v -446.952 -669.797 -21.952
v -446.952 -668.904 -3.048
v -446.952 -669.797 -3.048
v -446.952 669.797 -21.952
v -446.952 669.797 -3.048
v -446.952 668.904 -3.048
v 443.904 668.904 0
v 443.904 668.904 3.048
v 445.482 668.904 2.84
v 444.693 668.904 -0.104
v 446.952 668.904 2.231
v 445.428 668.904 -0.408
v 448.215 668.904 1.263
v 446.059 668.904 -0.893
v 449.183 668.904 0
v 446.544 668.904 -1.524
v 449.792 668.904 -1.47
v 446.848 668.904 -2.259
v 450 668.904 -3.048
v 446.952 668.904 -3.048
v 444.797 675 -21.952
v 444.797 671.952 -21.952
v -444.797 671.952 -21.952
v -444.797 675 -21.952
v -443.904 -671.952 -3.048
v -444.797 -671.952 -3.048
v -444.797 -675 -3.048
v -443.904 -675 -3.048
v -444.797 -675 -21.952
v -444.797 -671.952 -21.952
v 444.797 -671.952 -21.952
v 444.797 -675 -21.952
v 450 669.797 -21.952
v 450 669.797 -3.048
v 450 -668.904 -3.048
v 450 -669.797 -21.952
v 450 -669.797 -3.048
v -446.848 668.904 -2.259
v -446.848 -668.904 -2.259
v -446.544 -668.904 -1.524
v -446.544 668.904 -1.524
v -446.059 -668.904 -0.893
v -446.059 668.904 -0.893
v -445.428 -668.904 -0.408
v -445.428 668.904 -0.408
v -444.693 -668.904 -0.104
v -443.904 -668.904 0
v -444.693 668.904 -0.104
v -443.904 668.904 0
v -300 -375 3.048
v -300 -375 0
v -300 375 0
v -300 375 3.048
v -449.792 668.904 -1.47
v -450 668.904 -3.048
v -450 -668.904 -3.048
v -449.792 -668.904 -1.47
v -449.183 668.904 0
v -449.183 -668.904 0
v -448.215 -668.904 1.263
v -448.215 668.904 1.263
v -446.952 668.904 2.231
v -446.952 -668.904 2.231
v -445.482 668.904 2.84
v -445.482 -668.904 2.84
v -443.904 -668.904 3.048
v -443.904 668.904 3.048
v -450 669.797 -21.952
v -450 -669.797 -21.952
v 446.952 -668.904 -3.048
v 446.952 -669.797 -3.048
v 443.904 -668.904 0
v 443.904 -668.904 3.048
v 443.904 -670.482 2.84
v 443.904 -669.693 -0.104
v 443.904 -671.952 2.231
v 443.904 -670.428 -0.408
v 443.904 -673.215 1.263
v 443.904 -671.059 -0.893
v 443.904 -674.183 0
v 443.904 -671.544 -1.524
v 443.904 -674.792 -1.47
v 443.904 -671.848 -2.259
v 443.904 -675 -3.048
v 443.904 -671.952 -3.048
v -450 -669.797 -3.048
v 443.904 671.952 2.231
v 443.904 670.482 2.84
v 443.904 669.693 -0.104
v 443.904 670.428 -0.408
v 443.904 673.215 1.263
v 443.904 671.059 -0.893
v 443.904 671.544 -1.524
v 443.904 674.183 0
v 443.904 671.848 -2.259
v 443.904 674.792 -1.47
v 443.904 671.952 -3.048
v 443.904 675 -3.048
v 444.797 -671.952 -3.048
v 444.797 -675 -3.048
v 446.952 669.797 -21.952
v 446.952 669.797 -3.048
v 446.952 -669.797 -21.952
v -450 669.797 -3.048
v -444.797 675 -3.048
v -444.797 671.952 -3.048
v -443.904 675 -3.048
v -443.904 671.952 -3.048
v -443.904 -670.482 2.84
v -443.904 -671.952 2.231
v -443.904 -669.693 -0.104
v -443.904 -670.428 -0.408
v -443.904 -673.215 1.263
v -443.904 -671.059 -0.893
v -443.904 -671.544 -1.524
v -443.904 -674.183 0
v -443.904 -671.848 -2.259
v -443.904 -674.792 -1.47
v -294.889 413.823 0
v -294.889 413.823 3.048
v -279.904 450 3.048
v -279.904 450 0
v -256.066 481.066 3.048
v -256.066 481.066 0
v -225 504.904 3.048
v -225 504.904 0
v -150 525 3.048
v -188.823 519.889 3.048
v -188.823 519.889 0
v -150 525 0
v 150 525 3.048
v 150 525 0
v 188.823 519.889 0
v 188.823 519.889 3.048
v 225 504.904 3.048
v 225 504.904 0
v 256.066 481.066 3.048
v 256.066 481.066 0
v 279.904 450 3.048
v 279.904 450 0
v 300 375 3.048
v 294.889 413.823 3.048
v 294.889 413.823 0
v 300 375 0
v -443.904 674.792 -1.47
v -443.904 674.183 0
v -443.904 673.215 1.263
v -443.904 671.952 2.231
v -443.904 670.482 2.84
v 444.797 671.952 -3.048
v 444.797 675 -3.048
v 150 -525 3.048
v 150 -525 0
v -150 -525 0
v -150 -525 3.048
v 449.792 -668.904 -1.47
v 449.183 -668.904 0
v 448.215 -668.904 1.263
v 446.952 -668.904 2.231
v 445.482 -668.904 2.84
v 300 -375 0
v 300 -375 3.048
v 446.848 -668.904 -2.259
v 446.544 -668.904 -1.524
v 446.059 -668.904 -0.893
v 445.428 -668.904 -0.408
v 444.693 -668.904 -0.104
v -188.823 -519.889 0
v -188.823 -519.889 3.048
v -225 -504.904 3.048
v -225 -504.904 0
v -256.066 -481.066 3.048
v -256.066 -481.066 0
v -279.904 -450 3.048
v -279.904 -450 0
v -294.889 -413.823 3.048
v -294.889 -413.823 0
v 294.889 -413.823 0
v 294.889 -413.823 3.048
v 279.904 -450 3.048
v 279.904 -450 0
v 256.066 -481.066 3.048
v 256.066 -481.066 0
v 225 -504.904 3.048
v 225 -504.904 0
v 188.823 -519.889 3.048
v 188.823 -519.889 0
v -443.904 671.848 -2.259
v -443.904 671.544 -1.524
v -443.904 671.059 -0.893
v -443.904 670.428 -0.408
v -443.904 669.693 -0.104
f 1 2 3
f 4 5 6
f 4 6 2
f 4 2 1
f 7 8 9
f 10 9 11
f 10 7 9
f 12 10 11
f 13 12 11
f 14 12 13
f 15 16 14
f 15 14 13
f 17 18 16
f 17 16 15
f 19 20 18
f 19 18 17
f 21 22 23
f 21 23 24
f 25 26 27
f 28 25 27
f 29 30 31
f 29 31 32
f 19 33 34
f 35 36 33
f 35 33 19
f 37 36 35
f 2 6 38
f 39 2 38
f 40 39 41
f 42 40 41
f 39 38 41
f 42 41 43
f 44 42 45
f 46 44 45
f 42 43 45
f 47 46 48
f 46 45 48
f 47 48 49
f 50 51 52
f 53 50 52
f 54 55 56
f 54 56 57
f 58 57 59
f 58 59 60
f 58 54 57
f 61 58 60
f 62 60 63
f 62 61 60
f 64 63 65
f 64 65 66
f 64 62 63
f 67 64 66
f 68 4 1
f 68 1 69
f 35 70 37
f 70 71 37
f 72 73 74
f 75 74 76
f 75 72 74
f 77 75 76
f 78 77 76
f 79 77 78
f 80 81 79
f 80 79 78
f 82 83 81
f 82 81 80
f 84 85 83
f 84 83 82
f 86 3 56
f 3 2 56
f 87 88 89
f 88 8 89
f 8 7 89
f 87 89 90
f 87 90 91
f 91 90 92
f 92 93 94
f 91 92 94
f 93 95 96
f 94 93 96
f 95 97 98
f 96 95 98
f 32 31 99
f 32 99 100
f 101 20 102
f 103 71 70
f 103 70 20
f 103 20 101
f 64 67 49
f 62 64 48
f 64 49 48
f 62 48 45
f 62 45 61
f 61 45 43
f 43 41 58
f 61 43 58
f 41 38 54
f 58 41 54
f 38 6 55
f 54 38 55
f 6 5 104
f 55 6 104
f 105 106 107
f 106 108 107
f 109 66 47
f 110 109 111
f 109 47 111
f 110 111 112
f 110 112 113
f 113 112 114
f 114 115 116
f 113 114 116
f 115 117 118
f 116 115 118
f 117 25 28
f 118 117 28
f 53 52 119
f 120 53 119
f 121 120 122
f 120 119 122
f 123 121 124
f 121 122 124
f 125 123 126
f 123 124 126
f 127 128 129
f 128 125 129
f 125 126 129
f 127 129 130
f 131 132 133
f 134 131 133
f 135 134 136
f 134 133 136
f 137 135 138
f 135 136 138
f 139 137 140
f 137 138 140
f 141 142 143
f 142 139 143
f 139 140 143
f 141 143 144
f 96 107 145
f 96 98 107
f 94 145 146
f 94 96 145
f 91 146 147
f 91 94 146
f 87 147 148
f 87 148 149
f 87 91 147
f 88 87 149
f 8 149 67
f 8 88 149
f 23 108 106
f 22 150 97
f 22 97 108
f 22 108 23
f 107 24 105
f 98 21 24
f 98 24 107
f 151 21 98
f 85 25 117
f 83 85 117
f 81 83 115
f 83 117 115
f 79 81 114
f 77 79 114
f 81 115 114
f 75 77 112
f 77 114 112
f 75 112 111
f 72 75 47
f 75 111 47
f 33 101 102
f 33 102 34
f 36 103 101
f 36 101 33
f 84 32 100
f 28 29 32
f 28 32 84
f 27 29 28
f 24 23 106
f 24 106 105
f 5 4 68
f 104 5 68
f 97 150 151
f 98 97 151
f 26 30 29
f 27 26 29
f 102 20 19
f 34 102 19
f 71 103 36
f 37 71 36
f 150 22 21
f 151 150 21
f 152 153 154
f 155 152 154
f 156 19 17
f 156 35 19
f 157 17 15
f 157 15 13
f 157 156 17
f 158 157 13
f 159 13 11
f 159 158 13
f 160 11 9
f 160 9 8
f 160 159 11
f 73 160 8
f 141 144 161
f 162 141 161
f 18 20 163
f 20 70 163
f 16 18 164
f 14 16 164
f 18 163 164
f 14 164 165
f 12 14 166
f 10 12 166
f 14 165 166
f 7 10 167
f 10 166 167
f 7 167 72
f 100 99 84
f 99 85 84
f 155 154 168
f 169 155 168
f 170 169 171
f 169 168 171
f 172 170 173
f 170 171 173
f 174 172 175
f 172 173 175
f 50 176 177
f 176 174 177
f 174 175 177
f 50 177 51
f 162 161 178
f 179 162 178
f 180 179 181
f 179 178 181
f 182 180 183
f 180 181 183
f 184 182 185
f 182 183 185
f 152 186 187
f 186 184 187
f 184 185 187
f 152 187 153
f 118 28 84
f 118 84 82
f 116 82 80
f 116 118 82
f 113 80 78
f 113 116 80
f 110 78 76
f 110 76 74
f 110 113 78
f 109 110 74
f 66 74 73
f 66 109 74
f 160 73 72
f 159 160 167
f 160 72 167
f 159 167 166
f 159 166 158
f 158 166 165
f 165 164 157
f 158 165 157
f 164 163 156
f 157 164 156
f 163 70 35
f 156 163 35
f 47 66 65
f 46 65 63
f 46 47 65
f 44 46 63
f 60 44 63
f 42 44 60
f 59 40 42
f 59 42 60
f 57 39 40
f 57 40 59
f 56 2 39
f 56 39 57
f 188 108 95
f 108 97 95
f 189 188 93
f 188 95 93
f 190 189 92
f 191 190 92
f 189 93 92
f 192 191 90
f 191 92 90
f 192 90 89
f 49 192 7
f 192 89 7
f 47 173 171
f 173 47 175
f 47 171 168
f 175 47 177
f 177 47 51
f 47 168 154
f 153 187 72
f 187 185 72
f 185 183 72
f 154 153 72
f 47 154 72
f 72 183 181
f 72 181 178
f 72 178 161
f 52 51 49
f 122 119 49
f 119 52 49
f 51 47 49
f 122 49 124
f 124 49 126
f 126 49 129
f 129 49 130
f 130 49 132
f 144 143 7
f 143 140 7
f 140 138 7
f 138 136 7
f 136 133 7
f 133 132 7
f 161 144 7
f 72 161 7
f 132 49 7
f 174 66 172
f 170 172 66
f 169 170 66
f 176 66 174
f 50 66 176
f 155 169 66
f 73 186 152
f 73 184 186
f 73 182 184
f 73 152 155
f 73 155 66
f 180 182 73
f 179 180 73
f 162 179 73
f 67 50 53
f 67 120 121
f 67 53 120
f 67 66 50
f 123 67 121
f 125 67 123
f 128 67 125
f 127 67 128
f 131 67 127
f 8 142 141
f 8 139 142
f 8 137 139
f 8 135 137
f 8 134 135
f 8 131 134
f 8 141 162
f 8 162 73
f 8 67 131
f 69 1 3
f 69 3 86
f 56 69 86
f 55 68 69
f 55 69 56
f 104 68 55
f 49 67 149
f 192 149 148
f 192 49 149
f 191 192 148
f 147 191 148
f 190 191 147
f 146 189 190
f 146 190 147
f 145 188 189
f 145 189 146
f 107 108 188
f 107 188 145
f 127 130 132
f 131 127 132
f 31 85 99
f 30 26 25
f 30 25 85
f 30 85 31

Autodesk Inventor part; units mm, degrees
ref_plane "YZ Plane" through (0, 0, 0) normal (1, 0, 0) x (0, 1, 0)
ref_plane "XZ Plane" through (0, 0, 0) normal (0, 1, 0) x (-1, 0, 0)
ref_plane "XY Plane" through (0, 0, 0) normal (0, 0, 1) x (1, 0, 0)
sketch "Sketch1" plane through (0, 0, 0) normal (0, 0, 1) x (1, 0, 0)
  line L0 (-450, -675) -> (450, -675)
  line L1 (450, -675) -> (450, 675)
  line L2 (450, 675) -> (-450, 675)
  line L3 (-450, 675) -> (-450, -675)
  line L4 (-450, -675) -> (450, 675) construction
  line L5 (450, -675) -> (-450, 675) construction
  line L6 (-150, 525) -> (150, 525)
  line L7 (300, 375) -> (300, -375)
  line L8 (150, -525) -> (-150, -525)
  line L9 (-300, -375) -> (-300, 375)
  arc A0 (300, 375) -> (150, 525) centre (150, 375) ccw
  arc A1 (-150, 525) -> (-300, 375) centre (-150, 375) ccw
  arc A2 (-300, -375) -> (-150, -525) centre (-150, -375) ccw
  arc A3 (150, -525) -> (300, -375) centre (150, -375) ccw
  point P0 (0, 0)
  dimension "d0" = 900
  dimension "d1" = 1350
  dimension "d13" = 150
  dimension "d14" = 150
  dimension "d15" = 150
  dimension "d16" = 150
  dimension "d17" = 150
extrude "Plate3" add sketch "Sketch1" along normal blind 3.048
sketch "Sketch3" plane through (450, 671.952, 3.048) normal (0, 1, 0) x (-1, 0, 0)
  line L0 (900, 0) -> (0, 0)
  line L1 (0, 0) -> (0, -25)
  line L2 (0, -25) -> (900, -25)
  line L3 (900, -25) -> (900, 0)
edge flange "Flange2" height 25 angle 90 thickness 3.048 bend radius 3.048 thickness toward (0, 1, 0) relief tear relief width 3.048 relief depth 1.524 corner gap 3.048 corner form 2 edges at (0, 675, 0) (-450, 0, 0) (450, 0, 0) (0, -675, 0) wall of the first edge with corners at (-450, 671.952, 3.048) (450, 671.952, 3.048) (450, 671.952, -21.952) (-450, 671.952, -21.952)
bend "Bend2"
corner "Corner2"
equation "\"d18\" = Thickness"
equation "\"d19\" = BendReliefWidth"
equation "\"d20\" = BendReliefDepth"
equation "\"d21\" = MinimumRemnant"
equation "\"d22\" = TransitionRadius"
equation "\"d25\" = BendRadius"
equation "\"d26\" = CornerReliefSize"
equation "\"d27\" = GapSize"
equation "\"d28\" = JacobiRadiusSize"
equation "\"BendRadius\" = Thickness"
equation "\"BendReliefWidth\" = Thickness"
equation "\"BendReliefDepth\" = 0.5 * Thickness"
equation "\"CornerReliefSize\" = 4 * Thickness"
equation "\"MinimumRemnant\" = 2 * Thickness"
equation "\"TransitionRadius\" = BendRadius"
equation "\"JacobiRadiusSize\" = BendRadius"
equation "\"GapSize\" = Thickness"
equation "\"Space5\" = 0"
equation "\"Space6\" = 0"
equation "\"Space7\" = 0"
equation "\"Thickness\" = 3.048"
properties part number "TapaCentral"
